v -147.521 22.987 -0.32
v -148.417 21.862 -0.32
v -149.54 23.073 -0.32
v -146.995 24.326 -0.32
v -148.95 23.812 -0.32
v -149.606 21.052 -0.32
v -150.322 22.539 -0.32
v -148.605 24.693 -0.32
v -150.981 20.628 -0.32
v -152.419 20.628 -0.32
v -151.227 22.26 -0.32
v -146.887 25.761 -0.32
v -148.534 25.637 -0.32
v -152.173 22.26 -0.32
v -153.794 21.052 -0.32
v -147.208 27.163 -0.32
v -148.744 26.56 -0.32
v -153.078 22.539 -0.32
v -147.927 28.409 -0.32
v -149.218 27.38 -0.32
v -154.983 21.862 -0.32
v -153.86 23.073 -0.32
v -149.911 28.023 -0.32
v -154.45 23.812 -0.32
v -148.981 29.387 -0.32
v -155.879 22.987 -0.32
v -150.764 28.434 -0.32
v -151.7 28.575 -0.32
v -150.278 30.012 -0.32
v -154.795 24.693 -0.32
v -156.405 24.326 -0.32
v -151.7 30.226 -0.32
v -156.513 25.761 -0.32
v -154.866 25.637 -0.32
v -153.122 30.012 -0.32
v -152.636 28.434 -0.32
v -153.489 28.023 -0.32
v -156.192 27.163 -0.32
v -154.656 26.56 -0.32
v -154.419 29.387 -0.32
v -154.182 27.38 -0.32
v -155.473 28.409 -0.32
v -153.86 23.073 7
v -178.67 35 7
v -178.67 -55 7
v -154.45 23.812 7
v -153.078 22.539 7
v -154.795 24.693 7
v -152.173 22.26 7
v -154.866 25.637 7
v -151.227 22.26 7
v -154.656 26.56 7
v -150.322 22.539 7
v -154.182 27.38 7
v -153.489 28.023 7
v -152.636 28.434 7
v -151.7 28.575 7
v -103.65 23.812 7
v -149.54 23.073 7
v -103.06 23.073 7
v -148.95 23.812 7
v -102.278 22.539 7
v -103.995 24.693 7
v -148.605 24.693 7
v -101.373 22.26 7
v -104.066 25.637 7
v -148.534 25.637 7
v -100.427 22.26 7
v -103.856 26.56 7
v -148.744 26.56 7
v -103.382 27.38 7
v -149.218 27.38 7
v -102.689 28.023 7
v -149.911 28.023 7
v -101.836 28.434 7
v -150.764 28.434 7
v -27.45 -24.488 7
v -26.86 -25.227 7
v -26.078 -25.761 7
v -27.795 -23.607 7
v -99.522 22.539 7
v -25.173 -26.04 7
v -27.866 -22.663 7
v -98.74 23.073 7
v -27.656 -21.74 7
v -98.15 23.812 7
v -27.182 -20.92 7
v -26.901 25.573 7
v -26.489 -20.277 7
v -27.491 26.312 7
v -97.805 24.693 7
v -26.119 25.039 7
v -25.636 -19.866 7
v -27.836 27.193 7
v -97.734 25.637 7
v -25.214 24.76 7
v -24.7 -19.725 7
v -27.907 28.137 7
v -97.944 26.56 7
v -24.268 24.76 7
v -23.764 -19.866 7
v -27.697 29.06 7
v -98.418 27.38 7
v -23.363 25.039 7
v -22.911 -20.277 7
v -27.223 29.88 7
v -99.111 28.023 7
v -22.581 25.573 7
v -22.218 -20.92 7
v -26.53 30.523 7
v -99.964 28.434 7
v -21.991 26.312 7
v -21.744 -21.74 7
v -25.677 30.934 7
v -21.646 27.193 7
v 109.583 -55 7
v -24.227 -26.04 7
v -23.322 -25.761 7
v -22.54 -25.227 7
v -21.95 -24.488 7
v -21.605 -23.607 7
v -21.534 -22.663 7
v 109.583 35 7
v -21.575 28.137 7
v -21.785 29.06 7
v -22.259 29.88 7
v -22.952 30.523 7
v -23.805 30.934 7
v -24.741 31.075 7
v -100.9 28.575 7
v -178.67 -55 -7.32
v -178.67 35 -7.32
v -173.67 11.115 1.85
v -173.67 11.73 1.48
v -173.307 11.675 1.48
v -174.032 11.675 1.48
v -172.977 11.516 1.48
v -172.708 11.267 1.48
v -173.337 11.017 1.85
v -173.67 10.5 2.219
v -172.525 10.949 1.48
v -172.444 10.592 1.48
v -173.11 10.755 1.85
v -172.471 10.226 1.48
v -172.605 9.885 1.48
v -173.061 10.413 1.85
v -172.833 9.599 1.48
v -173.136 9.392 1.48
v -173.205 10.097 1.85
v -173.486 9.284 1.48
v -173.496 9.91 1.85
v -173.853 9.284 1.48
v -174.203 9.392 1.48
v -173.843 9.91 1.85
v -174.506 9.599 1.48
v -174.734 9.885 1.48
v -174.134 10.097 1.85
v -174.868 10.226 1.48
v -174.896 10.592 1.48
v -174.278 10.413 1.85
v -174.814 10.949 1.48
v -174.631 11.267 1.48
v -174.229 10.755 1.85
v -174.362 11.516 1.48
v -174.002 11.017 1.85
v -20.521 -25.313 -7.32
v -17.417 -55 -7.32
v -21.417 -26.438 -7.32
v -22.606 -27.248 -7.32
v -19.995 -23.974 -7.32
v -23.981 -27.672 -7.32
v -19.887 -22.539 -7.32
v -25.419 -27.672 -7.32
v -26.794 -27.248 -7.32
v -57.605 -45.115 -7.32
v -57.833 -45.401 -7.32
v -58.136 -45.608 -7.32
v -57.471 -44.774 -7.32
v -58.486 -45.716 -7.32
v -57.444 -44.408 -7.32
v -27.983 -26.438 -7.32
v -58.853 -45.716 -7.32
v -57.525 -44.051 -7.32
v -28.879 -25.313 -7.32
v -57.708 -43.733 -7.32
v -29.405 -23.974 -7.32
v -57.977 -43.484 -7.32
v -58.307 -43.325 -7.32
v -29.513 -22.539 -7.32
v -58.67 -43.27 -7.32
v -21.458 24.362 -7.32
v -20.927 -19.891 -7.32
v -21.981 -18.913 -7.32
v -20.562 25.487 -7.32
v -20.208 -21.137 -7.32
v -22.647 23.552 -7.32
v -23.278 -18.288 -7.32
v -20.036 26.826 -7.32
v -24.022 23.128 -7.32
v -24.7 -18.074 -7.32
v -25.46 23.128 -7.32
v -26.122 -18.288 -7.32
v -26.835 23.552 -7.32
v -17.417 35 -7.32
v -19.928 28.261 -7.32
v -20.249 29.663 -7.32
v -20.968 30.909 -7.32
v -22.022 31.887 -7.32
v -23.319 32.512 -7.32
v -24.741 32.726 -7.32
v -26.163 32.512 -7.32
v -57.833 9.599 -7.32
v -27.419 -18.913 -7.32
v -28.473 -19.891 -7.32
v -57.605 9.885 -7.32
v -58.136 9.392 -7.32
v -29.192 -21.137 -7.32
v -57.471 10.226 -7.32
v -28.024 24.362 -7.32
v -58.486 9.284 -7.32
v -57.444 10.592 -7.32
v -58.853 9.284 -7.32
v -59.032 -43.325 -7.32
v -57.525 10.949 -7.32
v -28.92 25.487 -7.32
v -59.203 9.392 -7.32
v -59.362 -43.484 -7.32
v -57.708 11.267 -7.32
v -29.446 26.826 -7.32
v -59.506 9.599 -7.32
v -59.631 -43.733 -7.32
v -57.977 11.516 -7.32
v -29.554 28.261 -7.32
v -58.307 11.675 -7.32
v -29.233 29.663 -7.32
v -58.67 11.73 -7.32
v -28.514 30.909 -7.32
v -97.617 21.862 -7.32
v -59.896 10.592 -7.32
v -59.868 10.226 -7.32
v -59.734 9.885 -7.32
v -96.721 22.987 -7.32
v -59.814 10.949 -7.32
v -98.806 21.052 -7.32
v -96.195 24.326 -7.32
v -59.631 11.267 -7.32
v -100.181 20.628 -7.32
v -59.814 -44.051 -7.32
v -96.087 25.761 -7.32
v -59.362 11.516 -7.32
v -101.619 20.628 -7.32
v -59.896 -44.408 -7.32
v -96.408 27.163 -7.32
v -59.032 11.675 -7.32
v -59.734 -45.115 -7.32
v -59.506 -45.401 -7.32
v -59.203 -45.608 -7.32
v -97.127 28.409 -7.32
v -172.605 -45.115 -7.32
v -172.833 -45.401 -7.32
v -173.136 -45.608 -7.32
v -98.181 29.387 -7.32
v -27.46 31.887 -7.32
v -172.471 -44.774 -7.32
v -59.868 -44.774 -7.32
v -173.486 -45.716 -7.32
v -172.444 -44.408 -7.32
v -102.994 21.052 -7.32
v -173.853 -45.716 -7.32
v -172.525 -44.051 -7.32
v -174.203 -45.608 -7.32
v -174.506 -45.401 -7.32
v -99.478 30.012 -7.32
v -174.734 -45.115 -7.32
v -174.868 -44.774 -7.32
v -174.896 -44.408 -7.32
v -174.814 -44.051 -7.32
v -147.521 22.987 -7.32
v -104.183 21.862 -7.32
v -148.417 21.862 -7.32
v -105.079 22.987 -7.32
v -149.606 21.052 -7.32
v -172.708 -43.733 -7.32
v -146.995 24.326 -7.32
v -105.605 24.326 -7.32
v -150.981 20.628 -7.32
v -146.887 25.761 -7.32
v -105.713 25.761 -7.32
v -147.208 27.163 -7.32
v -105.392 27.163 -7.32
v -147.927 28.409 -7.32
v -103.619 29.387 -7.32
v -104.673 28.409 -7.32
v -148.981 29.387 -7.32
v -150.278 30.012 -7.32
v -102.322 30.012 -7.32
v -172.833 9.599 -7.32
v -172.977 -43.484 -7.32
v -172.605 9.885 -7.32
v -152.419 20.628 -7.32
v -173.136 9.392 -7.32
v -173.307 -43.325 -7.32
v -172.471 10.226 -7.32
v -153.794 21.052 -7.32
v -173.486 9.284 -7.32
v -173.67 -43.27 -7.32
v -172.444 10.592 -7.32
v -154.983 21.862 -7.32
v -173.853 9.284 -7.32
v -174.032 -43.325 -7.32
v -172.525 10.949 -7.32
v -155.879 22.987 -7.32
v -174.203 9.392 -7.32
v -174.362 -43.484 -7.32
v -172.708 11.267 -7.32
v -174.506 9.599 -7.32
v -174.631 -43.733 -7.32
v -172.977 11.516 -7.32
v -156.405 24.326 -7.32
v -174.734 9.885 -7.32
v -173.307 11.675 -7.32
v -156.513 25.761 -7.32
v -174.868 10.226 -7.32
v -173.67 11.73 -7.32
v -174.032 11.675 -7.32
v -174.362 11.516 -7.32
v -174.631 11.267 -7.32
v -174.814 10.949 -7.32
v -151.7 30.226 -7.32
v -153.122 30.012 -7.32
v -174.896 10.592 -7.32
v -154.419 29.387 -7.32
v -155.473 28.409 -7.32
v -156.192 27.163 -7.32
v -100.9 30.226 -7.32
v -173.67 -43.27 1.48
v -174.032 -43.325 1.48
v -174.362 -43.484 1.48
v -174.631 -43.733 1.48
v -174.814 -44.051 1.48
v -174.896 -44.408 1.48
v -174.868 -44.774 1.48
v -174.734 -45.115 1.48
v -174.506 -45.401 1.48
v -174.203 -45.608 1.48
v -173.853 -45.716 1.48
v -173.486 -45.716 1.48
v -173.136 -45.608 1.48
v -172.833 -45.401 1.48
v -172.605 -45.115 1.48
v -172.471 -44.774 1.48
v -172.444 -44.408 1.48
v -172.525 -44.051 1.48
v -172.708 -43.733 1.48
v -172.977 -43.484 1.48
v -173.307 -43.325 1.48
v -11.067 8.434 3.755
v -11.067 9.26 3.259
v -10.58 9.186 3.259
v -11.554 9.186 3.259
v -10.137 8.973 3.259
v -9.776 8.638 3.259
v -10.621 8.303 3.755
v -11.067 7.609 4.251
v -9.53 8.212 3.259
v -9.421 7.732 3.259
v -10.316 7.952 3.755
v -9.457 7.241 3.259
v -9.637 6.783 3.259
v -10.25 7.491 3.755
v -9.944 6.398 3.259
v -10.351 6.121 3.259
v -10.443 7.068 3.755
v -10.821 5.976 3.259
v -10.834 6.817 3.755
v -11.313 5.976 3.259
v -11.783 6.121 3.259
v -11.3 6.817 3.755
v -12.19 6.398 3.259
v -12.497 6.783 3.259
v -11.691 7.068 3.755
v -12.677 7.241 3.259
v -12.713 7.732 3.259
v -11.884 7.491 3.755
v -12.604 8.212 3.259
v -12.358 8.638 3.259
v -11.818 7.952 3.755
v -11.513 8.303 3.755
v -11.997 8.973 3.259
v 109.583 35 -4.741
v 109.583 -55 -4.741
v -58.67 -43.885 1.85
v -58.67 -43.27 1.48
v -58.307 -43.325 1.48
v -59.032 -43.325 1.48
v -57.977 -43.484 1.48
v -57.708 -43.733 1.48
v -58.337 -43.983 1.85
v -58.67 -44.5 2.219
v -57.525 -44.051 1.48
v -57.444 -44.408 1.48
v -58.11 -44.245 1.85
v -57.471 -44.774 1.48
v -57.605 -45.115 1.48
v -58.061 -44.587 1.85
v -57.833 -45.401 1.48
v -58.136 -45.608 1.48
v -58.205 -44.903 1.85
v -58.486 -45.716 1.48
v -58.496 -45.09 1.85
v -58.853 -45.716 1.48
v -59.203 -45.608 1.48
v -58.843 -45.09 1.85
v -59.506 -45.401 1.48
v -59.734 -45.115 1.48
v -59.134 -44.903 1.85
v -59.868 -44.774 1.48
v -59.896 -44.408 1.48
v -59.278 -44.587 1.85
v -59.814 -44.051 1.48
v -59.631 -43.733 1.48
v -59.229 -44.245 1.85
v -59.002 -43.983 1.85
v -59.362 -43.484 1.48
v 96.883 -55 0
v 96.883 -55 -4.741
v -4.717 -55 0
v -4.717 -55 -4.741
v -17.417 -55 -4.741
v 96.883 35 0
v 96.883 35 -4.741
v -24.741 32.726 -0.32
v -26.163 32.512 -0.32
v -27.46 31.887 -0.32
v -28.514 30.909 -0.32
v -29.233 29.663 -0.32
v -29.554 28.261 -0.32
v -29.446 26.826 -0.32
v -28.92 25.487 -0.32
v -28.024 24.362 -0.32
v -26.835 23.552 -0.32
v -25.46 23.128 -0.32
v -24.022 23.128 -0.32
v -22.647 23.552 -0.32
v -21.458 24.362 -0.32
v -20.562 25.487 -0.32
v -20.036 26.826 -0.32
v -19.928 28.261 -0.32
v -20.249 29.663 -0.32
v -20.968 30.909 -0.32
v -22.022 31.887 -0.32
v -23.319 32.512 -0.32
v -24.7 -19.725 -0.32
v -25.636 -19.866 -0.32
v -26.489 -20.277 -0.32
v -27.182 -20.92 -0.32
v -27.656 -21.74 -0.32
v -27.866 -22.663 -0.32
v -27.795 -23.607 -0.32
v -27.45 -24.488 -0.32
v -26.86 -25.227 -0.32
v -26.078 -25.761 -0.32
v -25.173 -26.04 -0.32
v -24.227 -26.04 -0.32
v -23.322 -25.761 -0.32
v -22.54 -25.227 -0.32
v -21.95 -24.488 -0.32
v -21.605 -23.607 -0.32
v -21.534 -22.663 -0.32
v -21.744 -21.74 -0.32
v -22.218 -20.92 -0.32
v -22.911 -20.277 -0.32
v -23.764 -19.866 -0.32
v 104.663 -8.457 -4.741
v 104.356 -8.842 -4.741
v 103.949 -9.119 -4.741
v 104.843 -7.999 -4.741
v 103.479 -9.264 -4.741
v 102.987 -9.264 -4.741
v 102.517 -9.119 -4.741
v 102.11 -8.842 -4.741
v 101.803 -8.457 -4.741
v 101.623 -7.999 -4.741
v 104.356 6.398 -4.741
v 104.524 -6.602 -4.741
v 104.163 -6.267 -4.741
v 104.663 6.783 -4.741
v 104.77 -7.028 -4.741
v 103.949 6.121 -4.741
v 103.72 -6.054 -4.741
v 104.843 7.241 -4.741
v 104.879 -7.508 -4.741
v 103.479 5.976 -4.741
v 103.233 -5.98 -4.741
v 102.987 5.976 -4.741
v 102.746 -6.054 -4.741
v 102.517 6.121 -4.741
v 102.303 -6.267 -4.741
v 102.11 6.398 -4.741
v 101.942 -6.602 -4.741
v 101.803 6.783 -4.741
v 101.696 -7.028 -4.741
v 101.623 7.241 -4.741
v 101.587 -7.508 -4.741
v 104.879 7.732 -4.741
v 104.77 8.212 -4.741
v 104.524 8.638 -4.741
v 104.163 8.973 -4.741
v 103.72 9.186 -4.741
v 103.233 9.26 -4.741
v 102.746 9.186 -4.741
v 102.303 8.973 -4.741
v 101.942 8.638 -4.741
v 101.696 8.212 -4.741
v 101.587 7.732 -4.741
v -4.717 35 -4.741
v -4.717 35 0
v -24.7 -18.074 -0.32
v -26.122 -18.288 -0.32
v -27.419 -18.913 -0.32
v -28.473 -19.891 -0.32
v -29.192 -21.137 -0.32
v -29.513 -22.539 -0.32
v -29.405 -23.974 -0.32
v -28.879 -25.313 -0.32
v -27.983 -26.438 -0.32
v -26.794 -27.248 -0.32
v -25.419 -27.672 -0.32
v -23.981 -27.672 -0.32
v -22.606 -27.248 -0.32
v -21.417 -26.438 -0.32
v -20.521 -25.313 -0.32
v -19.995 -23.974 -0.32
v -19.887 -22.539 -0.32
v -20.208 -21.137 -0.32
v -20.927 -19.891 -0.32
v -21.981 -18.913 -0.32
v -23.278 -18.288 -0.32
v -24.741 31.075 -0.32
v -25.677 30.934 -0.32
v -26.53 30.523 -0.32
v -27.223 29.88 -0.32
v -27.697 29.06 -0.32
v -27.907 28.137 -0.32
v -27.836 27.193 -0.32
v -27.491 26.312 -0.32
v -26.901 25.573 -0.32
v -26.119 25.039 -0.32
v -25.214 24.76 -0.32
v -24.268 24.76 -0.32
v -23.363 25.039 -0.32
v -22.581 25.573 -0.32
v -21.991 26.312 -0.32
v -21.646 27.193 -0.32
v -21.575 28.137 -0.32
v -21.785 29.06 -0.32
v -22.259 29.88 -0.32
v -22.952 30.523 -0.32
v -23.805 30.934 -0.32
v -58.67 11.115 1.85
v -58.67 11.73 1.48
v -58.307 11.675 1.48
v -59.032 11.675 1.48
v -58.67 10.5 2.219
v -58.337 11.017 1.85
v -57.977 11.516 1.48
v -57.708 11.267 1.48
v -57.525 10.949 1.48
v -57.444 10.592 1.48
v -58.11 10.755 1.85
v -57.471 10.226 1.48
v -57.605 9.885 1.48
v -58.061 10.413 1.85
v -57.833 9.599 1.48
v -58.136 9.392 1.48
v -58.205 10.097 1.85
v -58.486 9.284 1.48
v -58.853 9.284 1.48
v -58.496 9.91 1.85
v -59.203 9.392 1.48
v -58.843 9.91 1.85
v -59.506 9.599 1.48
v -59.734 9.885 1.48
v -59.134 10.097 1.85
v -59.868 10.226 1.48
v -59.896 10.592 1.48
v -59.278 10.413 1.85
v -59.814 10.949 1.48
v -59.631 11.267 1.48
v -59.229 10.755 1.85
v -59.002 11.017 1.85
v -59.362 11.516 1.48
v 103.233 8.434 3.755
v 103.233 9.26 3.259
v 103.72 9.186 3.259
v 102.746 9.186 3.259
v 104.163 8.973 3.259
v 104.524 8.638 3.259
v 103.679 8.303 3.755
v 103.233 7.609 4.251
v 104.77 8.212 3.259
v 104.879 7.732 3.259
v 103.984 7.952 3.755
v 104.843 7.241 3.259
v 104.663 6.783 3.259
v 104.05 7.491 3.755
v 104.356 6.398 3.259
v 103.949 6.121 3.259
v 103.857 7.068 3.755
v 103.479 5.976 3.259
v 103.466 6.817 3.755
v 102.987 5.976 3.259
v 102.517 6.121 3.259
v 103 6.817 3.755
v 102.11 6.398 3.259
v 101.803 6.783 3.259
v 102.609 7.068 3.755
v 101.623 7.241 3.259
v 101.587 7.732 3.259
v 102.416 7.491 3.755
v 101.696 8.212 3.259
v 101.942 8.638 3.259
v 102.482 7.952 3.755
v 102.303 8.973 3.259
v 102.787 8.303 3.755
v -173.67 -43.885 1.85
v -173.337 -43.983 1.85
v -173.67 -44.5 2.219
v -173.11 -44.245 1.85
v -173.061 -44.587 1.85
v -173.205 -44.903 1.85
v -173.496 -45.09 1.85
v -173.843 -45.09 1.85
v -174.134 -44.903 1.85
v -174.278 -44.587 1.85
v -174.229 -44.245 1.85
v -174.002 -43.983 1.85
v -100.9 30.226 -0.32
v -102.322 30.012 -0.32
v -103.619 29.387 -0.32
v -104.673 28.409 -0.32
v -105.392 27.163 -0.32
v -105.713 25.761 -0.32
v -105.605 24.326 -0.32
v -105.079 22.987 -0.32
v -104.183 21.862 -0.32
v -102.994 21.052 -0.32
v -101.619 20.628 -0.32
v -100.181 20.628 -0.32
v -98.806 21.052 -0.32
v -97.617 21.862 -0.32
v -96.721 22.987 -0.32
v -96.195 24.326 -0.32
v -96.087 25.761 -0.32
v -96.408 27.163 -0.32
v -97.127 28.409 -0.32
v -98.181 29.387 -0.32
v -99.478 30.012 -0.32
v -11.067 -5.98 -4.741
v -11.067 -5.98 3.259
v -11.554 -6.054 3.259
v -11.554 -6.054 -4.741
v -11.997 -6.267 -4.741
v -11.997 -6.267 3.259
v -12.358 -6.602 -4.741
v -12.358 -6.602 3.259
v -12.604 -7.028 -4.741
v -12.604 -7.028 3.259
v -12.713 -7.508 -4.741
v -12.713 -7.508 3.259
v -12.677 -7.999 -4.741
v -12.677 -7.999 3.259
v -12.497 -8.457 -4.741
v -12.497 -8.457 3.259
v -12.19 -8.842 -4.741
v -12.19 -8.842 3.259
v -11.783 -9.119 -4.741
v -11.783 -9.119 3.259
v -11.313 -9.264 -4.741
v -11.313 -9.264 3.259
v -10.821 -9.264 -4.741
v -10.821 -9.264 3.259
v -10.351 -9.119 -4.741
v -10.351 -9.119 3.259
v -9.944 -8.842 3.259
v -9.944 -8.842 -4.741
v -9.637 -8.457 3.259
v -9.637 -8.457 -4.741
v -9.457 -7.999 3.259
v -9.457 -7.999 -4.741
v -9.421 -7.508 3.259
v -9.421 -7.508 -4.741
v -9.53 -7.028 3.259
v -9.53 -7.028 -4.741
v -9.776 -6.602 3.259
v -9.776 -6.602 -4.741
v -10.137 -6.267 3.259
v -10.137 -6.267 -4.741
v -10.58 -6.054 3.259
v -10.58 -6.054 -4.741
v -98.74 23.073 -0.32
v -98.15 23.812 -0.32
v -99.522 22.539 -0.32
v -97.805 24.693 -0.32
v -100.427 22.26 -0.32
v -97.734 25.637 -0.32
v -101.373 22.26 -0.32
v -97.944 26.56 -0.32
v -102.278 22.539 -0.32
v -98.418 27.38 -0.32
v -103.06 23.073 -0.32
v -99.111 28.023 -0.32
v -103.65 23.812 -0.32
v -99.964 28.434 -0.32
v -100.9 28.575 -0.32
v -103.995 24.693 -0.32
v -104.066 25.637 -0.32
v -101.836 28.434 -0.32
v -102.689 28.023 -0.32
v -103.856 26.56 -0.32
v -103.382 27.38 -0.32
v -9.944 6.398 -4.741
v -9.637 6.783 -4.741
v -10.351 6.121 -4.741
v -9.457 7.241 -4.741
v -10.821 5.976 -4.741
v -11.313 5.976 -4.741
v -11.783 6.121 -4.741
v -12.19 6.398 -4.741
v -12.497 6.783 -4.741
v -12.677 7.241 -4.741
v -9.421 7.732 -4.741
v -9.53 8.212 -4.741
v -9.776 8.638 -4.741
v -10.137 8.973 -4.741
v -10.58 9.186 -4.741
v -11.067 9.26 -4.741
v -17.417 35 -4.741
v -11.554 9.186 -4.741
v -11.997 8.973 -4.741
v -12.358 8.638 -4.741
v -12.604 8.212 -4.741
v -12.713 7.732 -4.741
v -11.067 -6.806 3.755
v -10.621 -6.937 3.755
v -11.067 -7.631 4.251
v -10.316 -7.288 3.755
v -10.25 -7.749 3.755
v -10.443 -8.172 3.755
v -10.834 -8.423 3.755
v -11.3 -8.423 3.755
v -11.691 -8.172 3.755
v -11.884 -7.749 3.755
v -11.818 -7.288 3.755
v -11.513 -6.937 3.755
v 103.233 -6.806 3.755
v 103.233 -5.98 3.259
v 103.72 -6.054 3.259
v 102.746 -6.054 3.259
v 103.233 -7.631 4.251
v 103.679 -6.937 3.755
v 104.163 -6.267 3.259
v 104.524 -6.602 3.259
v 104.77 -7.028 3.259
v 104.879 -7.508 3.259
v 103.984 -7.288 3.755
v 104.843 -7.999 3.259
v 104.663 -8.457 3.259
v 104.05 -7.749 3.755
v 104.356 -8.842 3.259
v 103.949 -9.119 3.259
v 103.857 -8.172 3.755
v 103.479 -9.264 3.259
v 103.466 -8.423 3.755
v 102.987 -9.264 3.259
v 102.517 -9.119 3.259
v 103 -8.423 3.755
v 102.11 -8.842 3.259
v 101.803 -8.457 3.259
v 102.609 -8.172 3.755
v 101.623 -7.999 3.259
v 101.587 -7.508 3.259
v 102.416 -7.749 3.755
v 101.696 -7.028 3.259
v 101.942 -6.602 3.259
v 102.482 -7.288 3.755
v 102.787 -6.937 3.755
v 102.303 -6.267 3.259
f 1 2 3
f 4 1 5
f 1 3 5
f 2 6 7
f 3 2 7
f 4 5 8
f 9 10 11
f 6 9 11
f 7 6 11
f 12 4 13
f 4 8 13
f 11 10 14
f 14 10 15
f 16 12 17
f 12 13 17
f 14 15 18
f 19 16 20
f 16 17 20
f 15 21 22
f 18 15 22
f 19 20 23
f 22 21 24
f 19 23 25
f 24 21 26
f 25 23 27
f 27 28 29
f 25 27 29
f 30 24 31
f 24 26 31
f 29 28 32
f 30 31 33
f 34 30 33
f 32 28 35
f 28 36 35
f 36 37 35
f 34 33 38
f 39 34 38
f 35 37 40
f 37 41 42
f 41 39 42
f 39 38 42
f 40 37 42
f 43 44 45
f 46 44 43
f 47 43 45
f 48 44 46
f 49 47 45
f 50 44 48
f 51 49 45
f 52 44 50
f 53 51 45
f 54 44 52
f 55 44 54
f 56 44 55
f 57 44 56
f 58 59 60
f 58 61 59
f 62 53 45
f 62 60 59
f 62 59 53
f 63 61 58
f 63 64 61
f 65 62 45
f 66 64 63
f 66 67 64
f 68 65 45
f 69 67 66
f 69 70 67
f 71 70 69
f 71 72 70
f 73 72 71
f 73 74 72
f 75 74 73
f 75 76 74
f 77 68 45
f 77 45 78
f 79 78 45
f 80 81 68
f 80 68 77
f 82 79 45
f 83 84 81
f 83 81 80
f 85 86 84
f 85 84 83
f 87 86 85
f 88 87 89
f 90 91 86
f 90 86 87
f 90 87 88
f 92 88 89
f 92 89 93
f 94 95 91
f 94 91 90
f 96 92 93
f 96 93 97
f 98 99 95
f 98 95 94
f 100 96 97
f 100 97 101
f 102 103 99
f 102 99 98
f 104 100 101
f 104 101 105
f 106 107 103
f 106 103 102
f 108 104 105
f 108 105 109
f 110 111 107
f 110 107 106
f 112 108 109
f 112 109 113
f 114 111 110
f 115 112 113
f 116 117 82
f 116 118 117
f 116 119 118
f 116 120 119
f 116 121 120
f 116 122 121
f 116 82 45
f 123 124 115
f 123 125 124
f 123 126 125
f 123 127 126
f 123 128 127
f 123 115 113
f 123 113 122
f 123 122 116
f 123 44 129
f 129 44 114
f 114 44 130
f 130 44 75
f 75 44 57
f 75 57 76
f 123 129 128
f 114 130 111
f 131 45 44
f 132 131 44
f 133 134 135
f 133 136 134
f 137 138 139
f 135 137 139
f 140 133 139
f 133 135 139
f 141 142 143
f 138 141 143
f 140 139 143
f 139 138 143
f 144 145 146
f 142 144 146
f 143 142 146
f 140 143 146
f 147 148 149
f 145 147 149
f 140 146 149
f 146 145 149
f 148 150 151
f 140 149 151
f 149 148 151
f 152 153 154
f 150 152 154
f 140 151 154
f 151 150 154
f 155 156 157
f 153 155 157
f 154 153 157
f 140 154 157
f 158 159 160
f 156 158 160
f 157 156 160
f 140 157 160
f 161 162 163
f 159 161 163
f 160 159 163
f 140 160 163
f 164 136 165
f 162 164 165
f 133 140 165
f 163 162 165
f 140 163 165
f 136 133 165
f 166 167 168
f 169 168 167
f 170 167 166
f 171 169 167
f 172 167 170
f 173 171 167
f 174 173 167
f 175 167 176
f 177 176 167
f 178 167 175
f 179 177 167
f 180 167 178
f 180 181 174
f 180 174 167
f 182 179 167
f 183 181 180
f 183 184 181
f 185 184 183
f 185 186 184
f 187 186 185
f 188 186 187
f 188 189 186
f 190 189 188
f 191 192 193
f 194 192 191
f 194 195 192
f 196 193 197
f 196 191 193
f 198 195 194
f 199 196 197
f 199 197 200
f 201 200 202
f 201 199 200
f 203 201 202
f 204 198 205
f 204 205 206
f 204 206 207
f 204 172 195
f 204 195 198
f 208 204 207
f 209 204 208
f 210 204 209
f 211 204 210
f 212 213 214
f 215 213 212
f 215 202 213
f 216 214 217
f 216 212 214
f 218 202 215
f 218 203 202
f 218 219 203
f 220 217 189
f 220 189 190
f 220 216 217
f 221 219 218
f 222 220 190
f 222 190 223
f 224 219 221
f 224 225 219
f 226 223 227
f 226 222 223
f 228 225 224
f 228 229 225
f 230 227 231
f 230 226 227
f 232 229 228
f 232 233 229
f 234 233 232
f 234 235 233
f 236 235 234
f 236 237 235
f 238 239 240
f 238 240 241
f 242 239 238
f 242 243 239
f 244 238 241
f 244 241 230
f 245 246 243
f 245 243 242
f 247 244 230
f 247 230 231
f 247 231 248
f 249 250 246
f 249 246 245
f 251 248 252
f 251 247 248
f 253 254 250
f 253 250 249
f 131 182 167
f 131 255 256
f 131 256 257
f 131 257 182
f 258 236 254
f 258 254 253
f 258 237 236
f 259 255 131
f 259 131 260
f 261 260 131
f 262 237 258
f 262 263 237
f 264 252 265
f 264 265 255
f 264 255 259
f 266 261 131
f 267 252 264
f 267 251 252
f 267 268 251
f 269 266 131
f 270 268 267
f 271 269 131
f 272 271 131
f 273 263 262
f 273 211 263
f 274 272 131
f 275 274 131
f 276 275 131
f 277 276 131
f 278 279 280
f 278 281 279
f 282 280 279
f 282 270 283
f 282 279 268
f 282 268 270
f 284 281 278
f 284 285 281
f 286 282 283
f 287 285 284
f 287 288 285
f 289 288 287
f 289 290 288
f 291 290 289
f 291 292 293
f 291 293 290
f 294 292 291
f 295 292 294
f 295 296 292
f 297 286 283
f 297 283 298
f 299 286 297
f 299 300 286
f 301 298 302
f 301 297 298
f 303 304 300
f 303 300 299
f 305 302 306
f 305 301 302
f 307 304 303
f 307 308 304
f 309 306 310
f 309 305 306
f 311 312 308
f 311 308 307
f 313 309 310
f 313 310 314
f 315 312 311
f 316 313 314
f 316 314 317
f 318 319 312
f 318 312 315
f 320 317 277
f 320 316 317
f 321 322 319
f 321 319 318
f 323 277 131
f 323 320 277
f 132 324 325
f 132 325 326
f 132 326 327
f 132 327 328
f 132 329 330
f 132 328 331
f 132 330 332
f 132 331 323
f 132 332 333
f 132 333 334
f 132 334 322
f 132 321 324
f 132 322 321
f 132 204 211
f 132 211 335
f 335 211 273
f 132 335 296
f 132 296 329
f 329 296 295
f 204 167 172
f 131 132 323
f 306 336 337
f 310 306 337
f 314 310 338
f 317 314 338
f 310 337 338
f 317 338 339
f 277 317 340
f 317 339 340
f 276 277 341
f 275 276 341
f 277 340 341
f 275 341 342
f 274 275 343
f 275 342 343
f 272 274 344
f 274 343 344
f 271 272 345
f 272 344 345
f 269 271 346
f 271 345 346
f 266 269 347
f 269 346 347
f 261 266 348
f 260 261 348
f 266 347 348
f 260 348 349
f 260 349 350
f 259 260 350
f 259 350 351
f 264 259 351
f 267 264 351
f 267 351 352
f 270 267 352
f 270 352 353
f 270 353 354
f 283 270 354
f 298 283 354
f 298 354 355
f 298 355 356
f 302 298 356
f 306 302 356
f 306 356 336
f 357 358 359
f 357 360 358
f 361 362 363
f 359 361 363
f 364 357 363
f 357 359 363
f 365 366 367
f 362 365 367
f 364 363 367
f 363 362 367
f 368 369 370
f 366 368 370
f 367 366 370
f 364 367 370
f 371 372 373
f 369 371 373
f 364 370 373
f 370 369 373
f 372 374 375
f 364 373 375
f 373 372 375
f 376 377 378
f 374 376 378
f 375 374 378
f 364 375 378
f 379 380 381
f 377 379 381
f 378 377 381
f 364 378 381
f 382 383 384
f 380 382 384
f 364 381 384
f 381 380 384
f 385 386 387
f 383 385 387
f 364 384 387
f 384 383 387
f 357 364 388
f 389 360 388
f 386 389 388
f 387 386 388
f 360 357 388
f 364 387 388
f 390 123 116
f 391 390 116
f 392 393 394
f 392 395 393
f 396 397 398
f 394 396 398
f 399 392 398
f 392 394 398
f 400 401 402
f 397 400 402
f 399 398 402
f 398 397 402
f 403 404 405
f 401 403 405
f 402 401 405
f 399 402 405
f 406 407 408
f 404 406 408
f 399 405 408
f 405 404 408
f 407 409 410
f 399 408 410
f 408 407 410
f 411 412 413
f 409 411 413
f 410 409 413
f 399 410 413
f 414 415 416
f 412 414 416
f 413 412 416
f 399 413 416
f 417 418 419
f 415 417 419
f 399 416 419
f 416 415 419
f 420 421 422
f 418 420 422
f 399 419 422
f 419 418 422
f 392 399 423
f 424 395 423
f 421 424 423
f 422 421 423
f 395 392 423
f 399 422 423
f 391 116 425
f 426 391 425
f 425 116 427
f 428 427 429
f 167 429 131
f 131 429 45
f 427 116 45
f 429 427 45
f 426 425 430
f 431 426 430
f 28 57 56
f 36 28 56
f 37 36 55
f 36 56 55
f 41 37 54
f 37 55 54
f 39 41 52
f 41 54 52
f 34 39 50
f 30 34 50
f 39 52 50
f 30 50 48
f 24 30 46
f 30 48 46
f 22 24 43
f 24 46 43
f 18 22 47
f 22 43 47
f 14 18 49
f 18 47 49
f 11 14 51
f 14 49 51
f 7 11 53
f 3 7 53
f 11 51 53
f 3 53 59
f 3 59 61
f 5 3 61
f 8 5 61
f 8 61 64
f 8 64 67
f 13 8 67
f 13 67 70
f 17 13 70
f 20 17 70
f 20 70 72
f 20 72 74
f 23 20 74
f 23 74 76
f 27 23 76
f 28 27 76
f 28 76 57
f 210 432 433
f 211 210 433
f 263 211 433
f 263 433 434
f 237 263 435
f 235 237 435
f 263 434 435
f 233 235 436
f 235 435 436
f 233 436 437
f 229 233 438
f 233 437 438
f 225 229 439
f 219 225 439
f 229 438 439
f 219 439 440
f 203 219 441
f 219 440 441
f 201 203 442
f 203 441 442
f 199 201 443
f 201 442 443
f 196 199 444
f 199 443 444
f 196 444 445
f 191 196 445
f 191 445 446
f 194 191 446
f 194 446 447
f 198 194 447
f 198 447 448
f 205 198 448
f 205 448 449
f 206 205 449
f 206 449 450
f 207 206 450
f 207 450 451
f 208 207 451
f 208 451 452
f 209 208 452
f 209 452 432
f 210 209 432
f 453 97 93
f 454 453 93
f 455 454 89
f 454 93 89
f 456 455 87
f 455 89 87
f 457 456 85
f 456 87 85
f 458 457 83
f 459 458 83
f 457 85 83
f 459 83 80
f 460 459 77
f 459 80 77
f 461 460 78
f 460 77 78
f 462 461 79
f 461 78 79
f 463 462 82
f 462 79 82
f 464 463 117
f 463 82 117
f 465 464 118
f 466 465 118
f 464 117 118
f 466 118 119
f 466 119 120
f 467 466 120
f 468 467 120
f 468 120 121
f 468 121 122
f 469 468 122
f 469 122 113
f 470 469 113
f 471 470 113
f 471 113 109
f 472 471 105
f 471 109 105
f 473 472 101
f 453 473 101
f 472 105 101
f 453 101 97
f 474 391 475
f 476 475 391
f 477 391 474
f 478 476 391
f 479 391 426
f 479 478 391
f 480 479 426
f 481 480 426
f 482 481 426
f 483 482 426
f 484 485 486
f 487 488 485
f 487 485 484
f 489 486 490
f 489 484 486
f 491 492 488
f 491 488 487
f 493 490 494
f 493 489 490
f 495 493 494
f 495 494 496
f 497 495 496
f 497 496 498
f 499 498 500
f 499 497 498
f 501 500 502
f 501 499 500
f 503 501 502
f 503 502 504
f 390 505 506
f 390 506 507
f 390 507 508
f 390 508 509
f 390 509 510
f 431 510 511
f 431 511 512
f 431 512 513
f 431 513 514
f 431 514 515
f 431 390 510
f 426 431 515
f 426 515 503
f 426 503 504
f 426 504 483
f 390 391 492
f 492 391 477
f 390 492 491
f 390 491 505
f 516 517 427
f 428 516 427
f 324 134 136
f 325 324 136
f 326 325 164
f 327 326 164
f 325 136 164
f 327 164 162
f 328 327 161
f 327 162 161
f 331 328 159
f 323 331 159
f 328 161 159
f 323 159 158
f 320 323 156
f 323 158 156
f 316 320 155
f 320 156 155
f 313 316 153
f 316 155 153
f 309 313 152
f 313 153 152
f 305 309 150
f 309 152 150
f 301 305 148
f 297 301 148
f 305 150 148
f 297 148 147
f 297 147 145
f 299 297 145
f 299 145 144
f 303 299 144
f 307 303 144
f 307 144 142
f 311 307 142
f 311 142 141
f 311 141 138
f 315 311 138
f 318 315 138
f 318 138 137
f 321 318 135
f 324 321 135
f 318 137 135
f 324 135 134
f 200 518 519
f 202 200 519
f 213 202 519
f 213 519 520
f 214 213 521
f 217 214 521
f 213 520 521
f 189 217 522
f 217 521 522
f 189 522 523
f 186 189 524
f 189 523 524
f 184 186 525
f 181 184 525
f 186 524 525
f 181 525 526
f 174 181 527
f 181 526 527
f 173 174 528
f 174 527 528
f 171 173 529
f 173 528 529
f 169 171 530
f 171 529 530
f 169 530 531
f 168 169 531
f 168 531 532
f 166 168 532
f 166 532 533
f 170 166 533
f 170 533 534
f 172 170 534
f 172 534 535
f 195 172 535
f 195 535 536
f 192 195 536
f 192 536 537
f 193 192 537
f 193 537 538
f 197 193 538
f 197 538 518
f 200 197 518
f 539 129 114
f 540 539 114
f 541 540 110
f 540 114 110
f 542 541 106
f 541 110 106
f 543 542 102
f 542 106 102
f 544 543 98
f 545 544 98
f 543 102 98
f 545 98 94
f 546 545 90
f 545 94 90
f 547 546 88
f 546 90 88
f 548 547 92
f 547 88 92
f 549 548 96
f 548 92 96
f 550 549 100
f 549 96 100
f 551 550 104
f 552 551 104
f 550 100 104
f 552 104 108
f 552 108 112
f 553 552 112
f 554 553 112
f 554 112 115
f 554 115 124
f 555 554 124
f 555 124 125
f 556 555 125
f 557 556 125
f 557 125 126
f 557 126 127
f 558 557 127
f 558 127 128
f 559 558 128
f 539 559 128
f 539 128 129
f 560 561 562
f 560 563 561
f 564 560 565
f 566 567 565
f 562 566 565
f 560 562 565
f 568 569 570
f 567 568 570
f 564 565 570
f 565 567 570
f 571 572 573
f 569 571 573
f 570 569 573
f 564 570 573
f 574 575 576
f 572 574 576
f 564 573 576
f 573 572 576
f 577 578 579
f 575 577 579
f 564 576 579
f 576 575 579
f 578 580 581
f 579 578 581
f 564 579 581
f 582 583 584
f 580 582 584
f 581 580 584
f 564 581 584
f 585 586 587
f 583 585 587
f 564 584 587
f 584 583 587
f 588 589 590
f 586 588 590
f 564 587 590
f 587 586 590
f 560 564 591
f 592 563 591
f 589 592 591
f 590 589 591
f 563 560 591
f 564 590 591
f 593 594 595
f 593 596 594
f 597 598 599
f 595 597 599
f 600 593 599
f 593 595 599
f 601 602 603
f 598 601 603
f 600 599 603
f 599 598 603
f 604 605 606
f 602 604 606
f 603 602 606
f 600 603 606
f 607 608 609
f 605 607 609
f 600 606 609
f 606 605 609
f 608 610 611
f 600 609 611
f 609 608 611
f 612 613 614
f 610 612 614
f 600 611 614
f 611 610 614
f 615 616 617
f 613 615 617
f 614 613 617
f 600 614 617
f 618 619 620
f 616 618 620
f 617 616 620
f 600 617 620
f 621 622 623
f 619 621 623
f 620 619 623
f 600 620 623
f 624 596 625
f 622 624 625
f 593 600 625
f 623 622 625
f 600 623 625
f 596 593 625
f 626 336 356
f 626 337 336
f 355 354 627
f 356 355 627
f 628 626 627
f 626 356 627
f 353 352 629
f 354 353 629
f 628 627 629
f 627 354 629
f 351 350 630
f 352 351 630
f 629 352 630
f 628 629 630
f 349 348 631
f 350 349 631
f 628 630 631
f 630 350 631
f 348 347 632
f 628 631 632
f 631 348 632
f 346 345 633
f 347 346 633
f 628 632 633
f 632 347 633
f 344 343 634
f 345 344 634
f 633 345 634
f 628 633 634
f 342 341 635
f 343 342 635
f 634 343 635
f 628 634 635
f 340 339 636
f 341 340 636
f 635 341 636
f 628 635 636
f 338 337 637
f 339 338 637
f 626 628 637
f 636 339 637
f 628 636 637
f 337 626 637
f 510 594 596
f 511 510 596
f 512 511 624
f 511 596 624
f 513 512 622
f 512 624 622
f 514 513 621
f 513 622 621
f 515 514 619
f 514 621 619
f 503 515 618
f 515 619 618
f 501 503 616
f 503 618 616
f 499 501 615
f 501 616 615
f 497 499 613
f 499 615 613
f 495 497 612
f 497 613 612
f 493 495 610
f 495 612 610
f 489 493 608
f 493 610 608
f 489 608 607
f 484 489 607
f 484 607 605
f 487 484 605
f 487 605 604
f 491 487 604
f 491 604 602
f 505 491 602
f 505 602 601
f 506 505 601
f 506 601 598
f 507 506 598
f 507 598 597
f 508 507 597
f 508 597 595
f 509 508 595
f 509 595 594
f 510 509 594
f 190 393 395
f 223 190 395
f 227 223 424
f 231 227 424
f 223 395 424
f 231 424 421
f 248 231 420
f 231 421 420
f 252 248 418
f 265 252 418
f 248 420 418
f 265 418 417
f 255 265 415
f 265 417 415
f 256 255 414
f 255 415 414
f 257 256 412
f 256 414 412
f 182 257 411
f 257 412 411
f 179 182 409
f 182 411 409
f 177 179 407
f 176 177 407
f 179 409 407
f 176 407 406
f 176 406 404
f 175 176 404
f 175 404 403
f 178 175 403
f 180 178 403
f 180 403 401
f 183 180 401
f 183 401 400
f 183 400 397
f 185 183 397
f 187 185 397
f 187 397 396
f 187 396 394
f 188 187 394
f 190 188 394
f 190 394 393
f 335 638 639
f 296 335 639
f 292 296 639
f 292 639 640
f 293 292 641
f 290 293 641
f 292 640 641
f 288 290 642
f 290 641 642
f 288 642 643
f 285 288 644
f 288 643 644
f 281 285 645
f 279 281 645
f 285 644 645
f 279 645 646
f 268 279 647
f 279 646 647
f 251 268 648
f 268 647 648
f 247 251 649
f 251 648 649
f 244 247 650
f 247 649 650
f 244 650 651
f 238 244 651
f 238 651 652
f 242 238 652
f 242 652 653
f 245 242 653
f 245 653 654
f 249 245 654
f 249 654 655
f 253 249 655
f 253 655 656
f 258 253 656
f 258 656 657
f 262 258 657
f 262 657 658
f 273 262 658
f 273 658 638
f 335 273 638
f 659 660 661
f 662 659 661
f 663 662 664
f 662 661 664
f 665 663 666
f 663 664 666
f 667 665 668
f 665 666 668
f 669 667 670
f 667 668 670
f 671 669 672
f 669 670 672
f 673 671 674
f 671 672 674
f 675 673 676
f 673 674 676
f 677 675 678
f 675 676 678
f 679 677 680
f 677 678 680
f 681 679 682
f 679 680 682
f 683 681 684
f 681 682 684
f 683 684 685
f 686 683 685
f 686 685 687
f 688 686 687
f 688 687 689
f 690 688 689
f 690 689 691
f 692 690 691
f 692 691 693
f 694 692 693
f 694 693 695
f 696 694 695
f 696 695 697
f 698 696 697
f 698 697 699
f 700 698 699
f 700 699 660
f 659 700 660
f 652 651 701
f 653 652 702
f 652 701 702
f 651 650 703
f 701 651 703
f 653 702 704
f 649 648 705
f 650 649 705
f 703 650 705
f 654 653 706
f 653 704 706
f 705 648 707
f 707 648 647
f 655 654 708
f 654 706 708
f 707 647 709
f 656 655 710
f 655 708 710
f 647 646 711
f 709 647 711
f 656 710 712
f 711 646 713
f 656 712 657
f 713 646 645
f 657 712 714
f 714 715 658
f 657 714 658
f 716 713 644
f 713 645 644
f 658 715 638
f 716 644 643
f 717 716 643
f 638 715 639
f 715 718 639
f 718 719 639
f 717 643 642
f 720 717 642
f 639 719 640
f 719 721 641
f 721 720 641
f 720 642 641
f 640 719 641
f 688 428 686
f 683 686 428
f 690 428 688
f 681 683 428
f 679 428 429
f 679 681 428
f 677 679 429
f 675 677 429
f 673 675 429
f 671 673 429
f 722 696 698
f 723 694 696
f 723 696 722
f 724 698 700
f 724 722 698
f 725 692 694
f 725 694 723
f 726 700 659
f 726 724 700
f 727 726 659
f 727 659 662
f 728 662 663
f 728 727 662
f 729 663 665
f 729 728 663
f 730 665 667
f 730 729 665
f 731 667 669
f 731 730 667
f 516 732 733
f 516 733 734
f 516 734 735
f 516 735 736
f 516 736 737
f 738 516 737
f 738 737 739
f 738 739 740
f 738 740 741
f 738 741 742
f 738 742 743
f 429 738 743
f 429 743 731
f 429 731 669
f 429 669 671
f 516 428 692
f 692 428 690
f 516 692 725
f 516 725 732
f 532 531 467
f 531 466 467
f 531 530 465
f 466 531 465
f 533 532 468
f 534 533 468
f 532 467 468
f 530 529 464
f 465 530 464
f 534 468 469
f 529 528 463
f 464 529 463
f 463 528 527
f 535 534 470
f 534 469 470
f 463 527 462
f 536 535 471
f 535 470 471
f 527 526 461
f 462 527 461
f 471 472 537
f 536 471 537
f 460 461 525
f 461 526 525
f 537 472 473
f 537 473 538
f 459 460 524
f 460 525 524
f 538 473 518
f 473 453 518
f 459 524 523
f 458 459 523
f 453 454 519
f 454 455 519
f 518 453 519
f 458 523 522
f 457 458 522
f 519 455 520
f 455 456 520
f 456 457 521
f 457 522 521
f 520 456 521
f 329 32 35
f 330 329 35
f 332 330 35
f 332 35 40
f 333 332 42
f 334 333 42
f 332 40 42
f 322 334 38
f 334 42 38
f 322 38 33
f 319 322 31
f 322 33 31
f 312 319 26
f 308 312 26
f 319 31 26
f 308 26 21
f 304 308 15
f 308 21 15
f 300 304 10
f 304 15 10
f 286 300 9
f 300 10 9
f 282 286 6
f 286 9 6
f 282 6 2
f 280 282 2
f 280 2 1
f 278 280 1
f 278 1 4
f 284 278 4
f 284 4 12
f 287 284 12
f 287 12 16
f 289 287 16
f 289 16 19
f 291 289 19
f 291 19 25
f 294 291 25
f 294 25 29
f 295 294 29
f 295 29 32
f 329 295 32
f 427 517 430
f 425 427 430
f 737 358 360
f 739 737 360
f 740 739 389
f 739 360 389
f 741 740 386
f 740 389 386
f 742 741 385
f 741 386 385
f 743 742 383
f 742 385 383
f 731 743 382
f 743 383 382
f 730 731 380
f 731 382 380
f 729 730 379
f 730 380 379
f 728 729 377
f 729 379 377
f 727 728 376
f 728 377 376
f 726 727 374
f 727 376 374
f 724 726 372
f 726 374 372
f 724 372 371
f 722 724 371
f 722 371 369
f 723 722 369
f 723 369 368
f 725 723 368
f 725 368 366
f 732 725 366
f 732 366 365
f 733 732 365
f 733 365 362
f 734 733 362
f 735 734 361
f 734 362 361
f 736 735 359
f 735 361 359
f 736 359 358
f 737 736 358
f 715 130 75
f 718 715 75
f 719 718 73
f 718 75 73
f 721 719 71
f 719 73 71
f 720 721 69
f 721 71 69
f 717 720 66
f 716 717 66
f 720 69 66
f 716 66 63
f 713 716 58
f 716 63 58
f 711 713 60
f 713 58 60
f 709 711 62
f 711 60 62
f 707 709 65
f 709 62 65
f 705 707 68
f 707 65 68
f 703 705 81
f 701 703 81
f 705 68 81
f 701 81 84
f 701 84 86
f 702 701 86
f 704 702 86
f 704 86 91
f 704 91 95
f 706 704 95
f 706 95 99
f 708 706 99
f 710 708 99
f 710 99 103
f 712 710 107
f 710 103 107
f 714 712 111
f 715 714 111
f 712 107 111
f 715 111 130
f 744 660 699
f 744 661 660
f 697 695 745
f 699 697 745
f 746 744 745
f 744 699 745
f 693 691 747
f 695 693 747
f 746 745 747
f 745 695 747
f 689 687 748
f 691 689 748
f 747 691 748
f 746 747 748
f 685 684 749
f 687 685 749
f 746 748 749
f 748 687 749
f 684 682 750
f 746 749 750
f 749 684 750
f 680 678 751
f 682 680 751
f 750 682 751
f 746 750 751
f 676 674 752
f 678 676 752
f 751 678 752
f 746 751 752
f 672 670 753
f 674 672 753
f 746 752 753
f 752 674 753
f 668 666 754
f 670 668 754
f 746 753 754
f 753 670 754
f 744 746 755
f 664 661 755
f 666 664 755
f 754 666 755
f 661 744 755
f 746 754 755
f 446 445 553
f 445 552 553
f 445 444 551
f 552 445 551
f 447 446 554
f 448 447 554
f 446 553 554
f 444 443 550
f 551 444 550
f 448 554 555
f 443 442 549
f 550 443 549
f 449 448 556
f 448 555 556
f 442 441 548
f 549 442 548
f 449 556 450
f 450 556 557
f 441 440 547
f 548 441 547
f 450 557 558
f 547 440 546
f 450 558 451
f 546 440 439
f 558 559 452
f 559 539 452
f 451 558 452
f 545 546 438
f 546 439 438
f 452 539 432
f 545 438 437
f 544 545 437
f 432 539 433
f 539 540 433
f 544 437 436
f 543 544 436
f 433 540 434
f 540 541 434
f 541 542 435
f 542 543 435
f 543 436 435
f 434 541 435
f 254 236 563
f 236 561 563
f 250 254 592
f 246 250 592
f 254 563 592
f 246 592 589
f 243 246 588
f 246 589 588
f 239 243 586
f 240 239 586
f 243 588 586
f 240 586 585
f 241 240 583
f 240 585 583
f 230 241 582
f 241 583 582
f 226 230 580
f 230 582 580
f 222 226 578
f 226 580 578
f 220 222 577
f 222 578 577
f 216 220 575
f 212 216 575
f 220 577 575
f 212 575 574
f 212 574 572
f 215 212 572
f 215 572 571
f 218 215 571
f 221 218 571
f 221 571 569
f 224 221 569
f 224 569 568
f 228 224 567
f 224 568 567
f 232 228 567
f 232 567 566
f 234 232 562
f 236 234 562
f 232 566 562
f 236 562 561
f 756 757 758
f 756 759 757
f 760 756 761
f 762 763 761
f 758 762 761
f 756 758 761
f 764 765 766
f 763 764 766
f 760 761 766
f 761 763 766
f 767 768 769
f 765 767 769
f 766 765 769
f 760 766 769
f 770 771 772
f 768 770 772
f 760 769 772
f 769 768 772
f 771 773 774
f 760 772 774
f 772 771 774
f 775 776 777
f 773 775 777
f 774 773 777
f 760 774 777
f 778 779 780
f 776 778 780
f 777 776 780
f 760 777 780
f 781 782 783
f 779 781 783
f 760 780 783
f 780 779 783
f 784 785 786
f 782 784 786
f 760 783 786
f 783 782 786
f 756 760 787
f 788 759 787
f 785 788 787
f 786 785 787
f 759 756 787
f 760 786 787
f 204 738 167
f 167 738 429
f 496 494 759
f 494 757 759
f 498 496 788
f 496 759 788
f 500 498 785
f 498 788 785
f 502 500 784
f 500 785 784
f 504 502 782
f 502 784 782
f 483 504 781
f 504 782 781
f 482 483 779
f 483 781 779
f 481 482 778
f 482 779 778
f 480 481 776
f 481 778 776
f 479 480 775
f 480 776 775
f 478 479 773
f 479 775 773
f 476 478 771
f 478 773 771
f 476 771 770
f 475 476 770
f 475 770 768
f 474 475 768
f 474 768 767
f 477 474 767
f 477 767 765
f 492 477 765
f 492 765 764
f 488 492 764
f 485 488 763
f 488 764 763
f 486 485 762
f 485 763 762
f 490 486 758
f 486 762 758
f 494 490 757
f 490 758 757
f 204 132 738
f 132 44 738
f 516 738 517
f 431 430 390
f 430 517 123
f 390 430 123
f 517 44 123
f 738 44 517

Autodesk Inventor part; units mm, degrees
ref_plane "YZ Plane" through (0, 0, 0) normal (1, 0, 0) x (0, 1, 0)
ref_plane "XZ Plane" through (0, 0, 0) normal (0, 1, 0) x (-1, 0, 0)
ref_plane "XY Plane" through (0, 0, 0) normal (0, 0, 1) x (1, 0, 0)
sketch "Sketch1" plane through (0, 0, 0) normal (0, 0, 1) x (1, 0, 0)
  line L0 (-192.5, 35) -> (192.5, 35)
  line L1 (192.5, 35) -> (192.5, -55)
  line L2 (192.5, -55) -> (-192.5, -55)
  line L3 (-192.5, -55) -> (-192.5, 35)
  point P0 (0, 0)
  dimension "d0" = 385
  dimension "d1" = 192.5
  dimension "d2" = 90
  dimension "d3" = 55
extrude "Extrusion1" add sketch "Sketch1" along normal blind 7
sketch "Sketch2" plane through (0, 0, 0) normal (0, 0, -1) x (-1, 0, 0)
  line L0 (192.5, 35) -> (-192.5, 35) projected
  line L1 (-192.5, 35) -> (-192.5, -55) projected
  line L2 (-192.5, -55) -> (192.5, -55) projected
  line L3 (17.417, 16.6256) -> (17.417, -16.6484) projected
  line L4 (-192.5, 16.6256) -> (-192.5, -16.6484) projected
  line L5 (17.417, 35) -> (17.417, -55)
  line L6 (4.717, 16.6256) -> (4.717, -16.6484) projected
  line L7 (-171.164, 18.034) -> (-179.8, 18.034) projected
  line L8 (-179.8, 16.6256) -> (-179.8, -16.6484) projected
  line L9 (-179.8, 35) -> (-179.8, -55)
  line L10 (4.717, 35) -> (4.717, -55)
  point P0 (0, 0)
extrude "Extrusion2" add sketch "Sketch2" along normal blind 4.7408 contours L5 L3 L2 L10 L6 L0 | L9 L8 L2 L1 L0
sketch "Sketch3" plane through (0, 0, 0) normal (0, 0, -1) x (-1, 0, 0)
  line L0 (17.417, 35) -> (17.417, -55) projected
  line L1 (17.417, -55) -> (192.5, -55) projected
  line L2 (63.2414, 16.4628) -> (60.0979, -19.4679) projected
  line L3 (17.417, 35) -> (67.417, 35)
  line L4 (67.417, 35) -> (67.417, -55)
  line L5 (67.417, -55) -> (17.417, -55)
  line L6 (17.417, -55) -> (17.417, 35)
  line L7 (76.6696, -19.4) -> (76.6696, 30.6) projected
  line L8 (17.417, 35) -> (76.6696, 35)
  line L9 (76.6696, -55) -> (17.417, -55)
  line L10 (17.417, -55) -> (17.417, 35)
  circle A0 centre (83.6696, -4.5) radius 1.5 projected
  circle A1 centre (83.6696, 10.5) radius 2 projected
  line L11 (87.4689, -18.5) -> (87.4689, -24.5) projected
  line L12 (88.6696, -24.5) -> (87.4689, -24.5) projected
  line L13 (88.6696, 15.5) -> (88.6696, -24.5) projected
  line L14 (78.6696, 15.5) -> (88.6696, 15.5) projected
  line L15 (78.6696, -15.5) -> (78.6696, 15.5) projected
  line L16 (78.6696, -15.5) -> (84.4689, -15.5) projected
  arc A2 (87.4689, -18.5) -> (84.4689, -15.5) centre (84.4689, -18.5) ccw projected
  line L17 (67.417, 35) -> (78.6696, 35)
  line L18 (78.6696, 35) -> (78.6696, -55)
  line L19 (78.6696, -55) -> (67.417, -55)
  line L20 (67.417, -55) -> (67.417, 35)
  point P0 (0, 0)
  dimension "d8" = 50
  dimension "d11" = 0
extrude "Extrusion3" add sketch "Sketch3" along normal blind 7.3198 contours L3 L4 L1 L0 | L8 L17 L18 L15 L1 L4
sketch "Sketch6" plane through (-192.5, -55, 7) normal (-1, 0, 0) x (0, 0, 1)
  line L0 (-23, 0) -> (-23, 65) projected
  circle A0 centre (-28, 23.1) radius 1.2295 projected
  circle A1 centre (-28, 53.1) radius 1.2295 projected
  point P0 (-7, 55)
hole "Hole1" at (-192.5, -31.9, -21) at (-192.5, -1.9, -21) direction (1, 0, 0) diameter 3 end through all counterbore diameter 5.75 counterbore depth 3
sketch "Sketch8" plane through (0, 0, 7) normal (0, 0, 1) x (1, 0, 0)
  circle A0 centre (-57.2416, -1.1152) radius 2.0828 projected
  circle A1 centre (-33.7068, 0.9439) radius 2.0828 projected
  point P0 (0, 0)
hole "Hole3" [suppressed]
sketch "Sketch9" plane through (0, 0, -4.7408) normal (0, 0, -1) x (-1, 0, 0)
  circle A0 centre (11.067, -7.6314) radius 2.1844 projected
  circle A1 centre (11.067, 7.6086) radius 2.1844 projected
  circle A2 centre (-186.15, -7.6314) radius 2.1844 projected
  circle A3 centre (-186.15, 7.6086) radius 2.1844 projected
  point P0 (0, 0)
hole "Hole4" at (-11.067, -7.6314, -4.7408) at (-11.067, 7.6086, -4.7408) at (186.15, -7.6314, -4.7408) at (186.15, 7.6086, -4.7408) direction (0, 0, 1) diameter 3.302 depth 8 tip angle 118 thread size "8-32 UNC" class "2B" standard "ANSI Unified Screw Threads"
sketch "Sketch10" plane through (0, 0, 0) normal (0, 0, -1) x (-1, 0, 0)
  line L0 (192.5, 35) -> (78.6696, 35) projected
  line L1 (178.6696, 15.5) -> (178.6696, -24.5) projected
  line L2 (178.6696, 35) -> (192.5, 35)
  line L3 (192.5, 35) -> (192.5, -55)
  line L4 (192.5, -55) -> (178.6696, -55)
  line L5 (178.6696, -55) -> (178.6696, 35)
  point P0 (0, 0)
extrude "Extrusion6" cut sketch "Sketch10" against normal blind 10
sketch "Sketch11" plane through (0, 0, 0) normal (0, 0, -1) x (-1, 0, 0)
  line L0 (178.6696, -55) -> (178.6696, 35) projected
  line L1 (178.6696, 35) -> (78.6696, 35) projected
  line L2 (78.6696, 35) -> (78.6696, -55) projected
  line L3 (78.6696, -55) -> (178.6696, -55) projected
  point P0 (0, 0)
extrude "Extrusion7" add sketch "Sketch11" along normal blind 7.3198
sketch "Sketch12" plane through (0, 0, -7.3198) normal (0, 0, -1) x (-1, 0, 0)
  circle A0 centre (173.6696, 10.5) radius 2 projected
  line L0 (78.6696, 15.5) -> (178.6696, 15.5) projected
  line L1 (178.6696, 15.5) -> (178.6696, -24.5) projected
  line L2 (178.6696, -24.5) -> (78.6696, -24.5) projected
  line L3 (78.6696, -24.5) -> (78.6696, 15.5) projected
  circle A1 centre (173.6696, -44.5) radius 2.0242
  circle A2 centre (58.6696, 10.5) radius 2.0032
  circle A3 centre (58.6696, -44.5) radius 2.0032
  point P0 (0, 0)
  dimension "d126" = 55
  dimension "d127" = 115
hole "Hole5" at (-173.6696, 10.5, -7.3198) direction (0, 0, 1) diameter 2.459 depth 8.8 tip angle 118 thread size "M3x0.5" class "6H" standard "ANSI Metric M Profile"
sketch "Sketch13" plane through (0, 0, -7.3198) normal (0, 0, -1) x (-1, 0, 0)
  line L0 (171.6696, -6) -> (175.6696, -6) projected
  arc A0 (175.6696, -6) -> (175.6696, -3) centre (175.6696, -4.5) ccw projected
  line L1 (175.6696, -3) -> (171.6696, -3) projected
  arc A1 (171.6696, -3) -> (171.6696, -6) centre (171.6696, -4.5) ccw projected
  circle A2 centre (83.6696, -4.5) radius 1.5 projected
  circle A3 centre (173.6696, 10.5) radius 2 projected
  circle A4 centre (173.6696, -19.5) radius 2 projected
  circle A5 centre (83.6696, 10.5) radius 2 projected
  circle A6 centre (83.6696, -19.5) radius 2 projected
  line L2 (78.6696, 15.5) -> (178.6696, 15.5) projected
  line L3 (178.6696, 15.5) -> (178.6696, -24.5) projected
  line L4 (178.6696, -24.5) -> (78.6696, -24.5) projected
  line L5 (78.6696, -24.5) -> (78.6696, 15.5) projected
  point P0 (0, 0)
  point P1 (173.6696, -4.5)
hole "Hole6" [suppressed]
sketch "Sketch14" plane through (0, 0, -7.3198) normal (0, 0, -1) x (-1, 0, 0)
  circle A0 centre (126.3, 25.4) radius 3.175 projected
  circle A1 centre (151.7, 25.4) radius 3.175 projected
  point P0 (0, 0)
  point P1 (100.9, 25.4)
  dimension "d63" = 50.8
hole "Hole7" at (-151.7, 25.4, -7.3198) at (-100.9, 25.4, -7.3198) direction (0, 0, 1) diameter 6.35 end through all counterbore diameter 9.652 counterbore depth 7
sketch "Sketch15" plane through (0, 0, -7.3198) normal (0, 0, -1) x (-1, 0, 0)
  line L0 (17.417, 35) -> (78.6696, 35) projected
  circle A0 centre (100.9, 25.4) radius 4.826 projected
  point P0 (0, 0)
  point P1 (24.741, 27.9)
  point P2 (24.7, -22.9)
  dimension "d71" = 7.1
  dimension "d72" = 76.2
  dimension "d73" = 76.2
  dimension "d74" = 50.8
hole "Hole8" at (-24.741, 27.9, -7.3198) at (-24.7, -22.9, -7.3198) direction (0, 0, 1) diameter 6.35 end through all counterbore diameter 9.652 counterbore depth 7
sketch "Sketch17" plane through (0, 0, 0) normal (0, 0, -1) x (-1, 0, 0)
  line L0 (-179.8, -55) -> (4.717, -55) projected
  line L1 (4.717, 35) -> (-179.8, 35) projected
  line L2 (-109.583, 16.6256) -> (-109.583, -16.6484) projected
  line L3 (-96.883, 16.6256) -> (-96.883, -16.6484) projected
  line L4 (-96.883, 35) -> (-109.583, 35)
  line L5 (-109.583, 35) -> (-109.583, -55)
  line L6 (-109.583, -55) -> (-96.883, -55)
  line L7 (-96.883, -55) -> (-96.883, 35)
  point P0 (0, 0)
extrude "Extrusion8" add sketch "Sketch17" along normal blind 4.7408
sketch "Sketch18" plane through (0, 0, -4.7408) normal (0, 0, -1) x (-1, 0, 0)
  circle A0 centre (-103.233, -7.6314) radius 2.1844 projected
  circle A1 centre (-103.233, 7.6086) radius 2.1844 projected
  point P0 (0, 0)
hole "Hole10" at (103.233, -7.6314, -4.7408) at (103.233, 7.6086, -4.7408) direction (0, 0, 1) diameter 3.302 depth 8 tip angle 118 thread size "8-32 UNC" class "2B" standard "ANSI Unified Screw Threads"
sketch "Sketch19" plane through (0, 0, -4.7408) normal (0, 0, -1) x (-1, 0, 0)
  line L0 (-192.5, -55) -> (-192.5, 35) projected
  line L1 (-179.8, -55) -> (-109.583, -55) projected
  line L2 (-109.583, 35) -> (-179.8, 35) projected
  line L3 (-109.583, 35) -> (-192.5, 35)
  line L4 (-192.5, 35) -> (-192.5, -55)
  line L5 (-192.5, -55) -> (-109.583, -55)
  line L6 (-109.583, -55) -> (-109.583, 35)
  point P0 (0, 0)
extrude "Extrusion9" cut sketch "Sketch19" against normal blind 25
sketch "Sketch20" plane through (0, 0, 0) normal (0, 0, -1) x (-1, 0, 0)
  circle A0 centre (24.7, -22.9) radius 4.826 projected
  circle A1 centre (24.741, 27.9) radius 4.826 projected
  point P0 (0, 0)
  point P1 (-76.9, -22.9)
  point P2 (-76.859, 27.9)
  dimension "d103" = 101.6
  dimension "d104" = 101.6
hole "Hole11" [suppressed]
hole "Hole12" [suppressed]
hole "Hole13" [suppressed]
hole "Hole14" at (-173.6696, -44.5, -7.3198) direction (0, 0, 1) diameter 2.459 depth 8.8 tip angle 118 thread size "M3x0.5" class "6H" standard "ANSI Metric M Profile"
hole "Hole15" at (-58.6696, 10.5, -7.3198) direction (0, 0, 1) diameter 2.459 depth 8.8 tip angle 118 thread size "M3x0.5" class "6H" standard "ANSI Metric M Profile"
hole "Hole16" at (-58.6696, -44.5, -7.3198) direction (0, 0, 1) diameter 2.459 depth 8.8 tip angle 118 thread size "M3x0.5" class "6H" standard "ANSI Metric M Profile"
properties part number "Oxxius laser subassy shortened baseplate"
